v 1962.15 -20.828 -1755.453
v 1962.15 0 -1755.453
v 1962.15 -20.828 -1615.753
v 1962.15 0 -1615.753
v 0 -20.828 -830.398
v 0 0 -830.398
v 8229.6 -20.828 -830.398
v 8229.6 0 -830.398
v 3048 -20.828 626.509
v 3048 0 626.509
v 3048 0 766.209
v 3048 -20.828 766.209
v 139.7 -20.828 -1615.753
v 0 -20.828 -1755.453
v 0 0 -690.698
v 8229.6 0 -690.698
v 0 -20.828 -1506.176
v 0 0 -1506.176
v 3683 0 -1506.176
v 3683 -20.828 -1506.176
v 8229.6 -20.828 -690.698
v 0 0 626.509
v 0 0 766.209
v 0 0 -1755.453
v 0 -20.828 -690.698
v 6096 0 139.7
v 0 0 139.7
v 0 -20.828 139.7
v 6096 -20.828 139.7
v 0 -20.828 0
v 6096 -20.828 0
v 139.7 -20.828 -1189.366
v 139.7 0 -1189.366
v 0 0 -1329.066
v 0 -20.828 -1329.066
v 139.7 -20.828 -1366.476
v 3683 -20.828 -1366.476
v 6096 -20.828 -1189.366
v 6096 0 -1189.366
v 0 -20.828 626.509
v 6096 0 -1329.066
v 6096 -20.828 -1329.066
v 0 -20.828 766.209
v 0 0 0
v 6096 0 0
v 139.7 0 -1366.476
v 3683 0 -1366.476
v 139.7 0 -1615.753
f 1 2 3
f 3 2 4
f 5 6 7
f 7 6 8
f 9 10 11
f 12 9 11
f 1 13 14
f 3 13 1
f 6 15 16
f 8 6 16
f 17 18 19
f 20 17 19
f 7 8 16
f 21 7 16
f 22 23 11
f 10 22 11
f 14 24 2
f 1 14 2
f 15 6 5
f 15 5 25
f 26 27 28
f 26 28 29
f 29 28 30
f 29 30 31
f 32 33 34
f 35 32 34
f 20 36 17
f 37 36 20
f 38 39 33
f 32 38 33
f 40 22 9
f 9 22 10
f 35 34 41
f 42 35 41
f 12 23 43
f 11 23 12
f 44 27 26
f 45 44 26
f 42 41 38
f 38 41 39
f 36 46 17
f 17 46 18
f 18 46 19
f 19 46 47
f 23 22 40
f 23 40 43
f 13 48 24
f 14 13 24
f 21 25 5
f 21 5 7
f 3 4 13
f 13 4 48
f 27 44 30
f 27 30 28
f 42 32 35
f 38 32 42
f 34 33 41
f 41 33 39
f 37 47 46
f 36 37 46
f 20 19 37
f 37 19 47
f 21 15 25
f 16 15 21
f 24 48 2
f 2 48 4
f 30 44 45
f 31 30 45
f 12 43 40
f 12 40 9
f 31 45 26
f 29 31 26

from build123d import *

# Parameters (mm, degrees)
F0_W      = 6096
F0_H      = 139.7
F1_DEPTH  = 20.828
F2_W      = 3048
F2_H      = 139.7
F3_DEPTH  = 20.828
F4_W      = 8229.6
F4_H      = 139.7
F5_DEPTH  = 20.828
F7_DEPTH  = 20.828
F9_DEPTH  = 20.828
F11_DEPTH = 20.828


with BuildPart() as f1:
    # F0 (on Front) → F1 (new body)
    with BuildSketch(Plane.XZ):
        with Locations((3048, 69.85)):
            Rectangle(F0_W, F0_H)
    extrude(amount=F1_DEPTH)


with BuildPart() as f3:
    # F2 (on Front) → F3 (new body)
    with BuildSketch(Plane.XZ):
        with Locations((1524, 696.359217)):
            Rectangle(F2_W, F2_H)
    extrude(amount=F3_DEPTH)


with BuildPart() as f5:
    # F4 (on Front) → F5 (new body)
    with BuildSketch(Plane.XZ):
        with Locations((4114.8, -760.54844)):
            Rectangle(F4_W, F4_H)
    extrude(amount=F5_DEPTH)


with BuildPart() as f7:
    # F6 (on Front) → F7 (new body)
    with BuildSketch(Plane.XZ):
        Polygon((6096, -1189.366277), (139.7, -1189.366277), (0, -1329.066277), (6096, -1329.066277), align=None)
    extrude(amount=F7_DEPTH)


with BuildPart() as f9:
    # F8 (on Front) → F9 (new body)
    with BuildSketch(Plane.XZ):
        Polygon((1962.15, -1615.752752), (139.7, -1615.752752), (0, -1755.452752), (1962.15, -1755.452752), align=None)
    extrude(amount=F9_DEPTH)


with BuildPart() as f11:
    # F10 (on Front) → F11 (new body)
    with BuildSketch(Plane.XZ):
        Polygon((3683, -1366.475518), (139.7, -1366.475518), (0, -1506.175518), (3683, -1506.175518), align=None)
    extrude(amount=F11_DEPTH)


solid = Compound([f1.part, f3.part, f5.part, f7.part, f9.part, f11.part])
